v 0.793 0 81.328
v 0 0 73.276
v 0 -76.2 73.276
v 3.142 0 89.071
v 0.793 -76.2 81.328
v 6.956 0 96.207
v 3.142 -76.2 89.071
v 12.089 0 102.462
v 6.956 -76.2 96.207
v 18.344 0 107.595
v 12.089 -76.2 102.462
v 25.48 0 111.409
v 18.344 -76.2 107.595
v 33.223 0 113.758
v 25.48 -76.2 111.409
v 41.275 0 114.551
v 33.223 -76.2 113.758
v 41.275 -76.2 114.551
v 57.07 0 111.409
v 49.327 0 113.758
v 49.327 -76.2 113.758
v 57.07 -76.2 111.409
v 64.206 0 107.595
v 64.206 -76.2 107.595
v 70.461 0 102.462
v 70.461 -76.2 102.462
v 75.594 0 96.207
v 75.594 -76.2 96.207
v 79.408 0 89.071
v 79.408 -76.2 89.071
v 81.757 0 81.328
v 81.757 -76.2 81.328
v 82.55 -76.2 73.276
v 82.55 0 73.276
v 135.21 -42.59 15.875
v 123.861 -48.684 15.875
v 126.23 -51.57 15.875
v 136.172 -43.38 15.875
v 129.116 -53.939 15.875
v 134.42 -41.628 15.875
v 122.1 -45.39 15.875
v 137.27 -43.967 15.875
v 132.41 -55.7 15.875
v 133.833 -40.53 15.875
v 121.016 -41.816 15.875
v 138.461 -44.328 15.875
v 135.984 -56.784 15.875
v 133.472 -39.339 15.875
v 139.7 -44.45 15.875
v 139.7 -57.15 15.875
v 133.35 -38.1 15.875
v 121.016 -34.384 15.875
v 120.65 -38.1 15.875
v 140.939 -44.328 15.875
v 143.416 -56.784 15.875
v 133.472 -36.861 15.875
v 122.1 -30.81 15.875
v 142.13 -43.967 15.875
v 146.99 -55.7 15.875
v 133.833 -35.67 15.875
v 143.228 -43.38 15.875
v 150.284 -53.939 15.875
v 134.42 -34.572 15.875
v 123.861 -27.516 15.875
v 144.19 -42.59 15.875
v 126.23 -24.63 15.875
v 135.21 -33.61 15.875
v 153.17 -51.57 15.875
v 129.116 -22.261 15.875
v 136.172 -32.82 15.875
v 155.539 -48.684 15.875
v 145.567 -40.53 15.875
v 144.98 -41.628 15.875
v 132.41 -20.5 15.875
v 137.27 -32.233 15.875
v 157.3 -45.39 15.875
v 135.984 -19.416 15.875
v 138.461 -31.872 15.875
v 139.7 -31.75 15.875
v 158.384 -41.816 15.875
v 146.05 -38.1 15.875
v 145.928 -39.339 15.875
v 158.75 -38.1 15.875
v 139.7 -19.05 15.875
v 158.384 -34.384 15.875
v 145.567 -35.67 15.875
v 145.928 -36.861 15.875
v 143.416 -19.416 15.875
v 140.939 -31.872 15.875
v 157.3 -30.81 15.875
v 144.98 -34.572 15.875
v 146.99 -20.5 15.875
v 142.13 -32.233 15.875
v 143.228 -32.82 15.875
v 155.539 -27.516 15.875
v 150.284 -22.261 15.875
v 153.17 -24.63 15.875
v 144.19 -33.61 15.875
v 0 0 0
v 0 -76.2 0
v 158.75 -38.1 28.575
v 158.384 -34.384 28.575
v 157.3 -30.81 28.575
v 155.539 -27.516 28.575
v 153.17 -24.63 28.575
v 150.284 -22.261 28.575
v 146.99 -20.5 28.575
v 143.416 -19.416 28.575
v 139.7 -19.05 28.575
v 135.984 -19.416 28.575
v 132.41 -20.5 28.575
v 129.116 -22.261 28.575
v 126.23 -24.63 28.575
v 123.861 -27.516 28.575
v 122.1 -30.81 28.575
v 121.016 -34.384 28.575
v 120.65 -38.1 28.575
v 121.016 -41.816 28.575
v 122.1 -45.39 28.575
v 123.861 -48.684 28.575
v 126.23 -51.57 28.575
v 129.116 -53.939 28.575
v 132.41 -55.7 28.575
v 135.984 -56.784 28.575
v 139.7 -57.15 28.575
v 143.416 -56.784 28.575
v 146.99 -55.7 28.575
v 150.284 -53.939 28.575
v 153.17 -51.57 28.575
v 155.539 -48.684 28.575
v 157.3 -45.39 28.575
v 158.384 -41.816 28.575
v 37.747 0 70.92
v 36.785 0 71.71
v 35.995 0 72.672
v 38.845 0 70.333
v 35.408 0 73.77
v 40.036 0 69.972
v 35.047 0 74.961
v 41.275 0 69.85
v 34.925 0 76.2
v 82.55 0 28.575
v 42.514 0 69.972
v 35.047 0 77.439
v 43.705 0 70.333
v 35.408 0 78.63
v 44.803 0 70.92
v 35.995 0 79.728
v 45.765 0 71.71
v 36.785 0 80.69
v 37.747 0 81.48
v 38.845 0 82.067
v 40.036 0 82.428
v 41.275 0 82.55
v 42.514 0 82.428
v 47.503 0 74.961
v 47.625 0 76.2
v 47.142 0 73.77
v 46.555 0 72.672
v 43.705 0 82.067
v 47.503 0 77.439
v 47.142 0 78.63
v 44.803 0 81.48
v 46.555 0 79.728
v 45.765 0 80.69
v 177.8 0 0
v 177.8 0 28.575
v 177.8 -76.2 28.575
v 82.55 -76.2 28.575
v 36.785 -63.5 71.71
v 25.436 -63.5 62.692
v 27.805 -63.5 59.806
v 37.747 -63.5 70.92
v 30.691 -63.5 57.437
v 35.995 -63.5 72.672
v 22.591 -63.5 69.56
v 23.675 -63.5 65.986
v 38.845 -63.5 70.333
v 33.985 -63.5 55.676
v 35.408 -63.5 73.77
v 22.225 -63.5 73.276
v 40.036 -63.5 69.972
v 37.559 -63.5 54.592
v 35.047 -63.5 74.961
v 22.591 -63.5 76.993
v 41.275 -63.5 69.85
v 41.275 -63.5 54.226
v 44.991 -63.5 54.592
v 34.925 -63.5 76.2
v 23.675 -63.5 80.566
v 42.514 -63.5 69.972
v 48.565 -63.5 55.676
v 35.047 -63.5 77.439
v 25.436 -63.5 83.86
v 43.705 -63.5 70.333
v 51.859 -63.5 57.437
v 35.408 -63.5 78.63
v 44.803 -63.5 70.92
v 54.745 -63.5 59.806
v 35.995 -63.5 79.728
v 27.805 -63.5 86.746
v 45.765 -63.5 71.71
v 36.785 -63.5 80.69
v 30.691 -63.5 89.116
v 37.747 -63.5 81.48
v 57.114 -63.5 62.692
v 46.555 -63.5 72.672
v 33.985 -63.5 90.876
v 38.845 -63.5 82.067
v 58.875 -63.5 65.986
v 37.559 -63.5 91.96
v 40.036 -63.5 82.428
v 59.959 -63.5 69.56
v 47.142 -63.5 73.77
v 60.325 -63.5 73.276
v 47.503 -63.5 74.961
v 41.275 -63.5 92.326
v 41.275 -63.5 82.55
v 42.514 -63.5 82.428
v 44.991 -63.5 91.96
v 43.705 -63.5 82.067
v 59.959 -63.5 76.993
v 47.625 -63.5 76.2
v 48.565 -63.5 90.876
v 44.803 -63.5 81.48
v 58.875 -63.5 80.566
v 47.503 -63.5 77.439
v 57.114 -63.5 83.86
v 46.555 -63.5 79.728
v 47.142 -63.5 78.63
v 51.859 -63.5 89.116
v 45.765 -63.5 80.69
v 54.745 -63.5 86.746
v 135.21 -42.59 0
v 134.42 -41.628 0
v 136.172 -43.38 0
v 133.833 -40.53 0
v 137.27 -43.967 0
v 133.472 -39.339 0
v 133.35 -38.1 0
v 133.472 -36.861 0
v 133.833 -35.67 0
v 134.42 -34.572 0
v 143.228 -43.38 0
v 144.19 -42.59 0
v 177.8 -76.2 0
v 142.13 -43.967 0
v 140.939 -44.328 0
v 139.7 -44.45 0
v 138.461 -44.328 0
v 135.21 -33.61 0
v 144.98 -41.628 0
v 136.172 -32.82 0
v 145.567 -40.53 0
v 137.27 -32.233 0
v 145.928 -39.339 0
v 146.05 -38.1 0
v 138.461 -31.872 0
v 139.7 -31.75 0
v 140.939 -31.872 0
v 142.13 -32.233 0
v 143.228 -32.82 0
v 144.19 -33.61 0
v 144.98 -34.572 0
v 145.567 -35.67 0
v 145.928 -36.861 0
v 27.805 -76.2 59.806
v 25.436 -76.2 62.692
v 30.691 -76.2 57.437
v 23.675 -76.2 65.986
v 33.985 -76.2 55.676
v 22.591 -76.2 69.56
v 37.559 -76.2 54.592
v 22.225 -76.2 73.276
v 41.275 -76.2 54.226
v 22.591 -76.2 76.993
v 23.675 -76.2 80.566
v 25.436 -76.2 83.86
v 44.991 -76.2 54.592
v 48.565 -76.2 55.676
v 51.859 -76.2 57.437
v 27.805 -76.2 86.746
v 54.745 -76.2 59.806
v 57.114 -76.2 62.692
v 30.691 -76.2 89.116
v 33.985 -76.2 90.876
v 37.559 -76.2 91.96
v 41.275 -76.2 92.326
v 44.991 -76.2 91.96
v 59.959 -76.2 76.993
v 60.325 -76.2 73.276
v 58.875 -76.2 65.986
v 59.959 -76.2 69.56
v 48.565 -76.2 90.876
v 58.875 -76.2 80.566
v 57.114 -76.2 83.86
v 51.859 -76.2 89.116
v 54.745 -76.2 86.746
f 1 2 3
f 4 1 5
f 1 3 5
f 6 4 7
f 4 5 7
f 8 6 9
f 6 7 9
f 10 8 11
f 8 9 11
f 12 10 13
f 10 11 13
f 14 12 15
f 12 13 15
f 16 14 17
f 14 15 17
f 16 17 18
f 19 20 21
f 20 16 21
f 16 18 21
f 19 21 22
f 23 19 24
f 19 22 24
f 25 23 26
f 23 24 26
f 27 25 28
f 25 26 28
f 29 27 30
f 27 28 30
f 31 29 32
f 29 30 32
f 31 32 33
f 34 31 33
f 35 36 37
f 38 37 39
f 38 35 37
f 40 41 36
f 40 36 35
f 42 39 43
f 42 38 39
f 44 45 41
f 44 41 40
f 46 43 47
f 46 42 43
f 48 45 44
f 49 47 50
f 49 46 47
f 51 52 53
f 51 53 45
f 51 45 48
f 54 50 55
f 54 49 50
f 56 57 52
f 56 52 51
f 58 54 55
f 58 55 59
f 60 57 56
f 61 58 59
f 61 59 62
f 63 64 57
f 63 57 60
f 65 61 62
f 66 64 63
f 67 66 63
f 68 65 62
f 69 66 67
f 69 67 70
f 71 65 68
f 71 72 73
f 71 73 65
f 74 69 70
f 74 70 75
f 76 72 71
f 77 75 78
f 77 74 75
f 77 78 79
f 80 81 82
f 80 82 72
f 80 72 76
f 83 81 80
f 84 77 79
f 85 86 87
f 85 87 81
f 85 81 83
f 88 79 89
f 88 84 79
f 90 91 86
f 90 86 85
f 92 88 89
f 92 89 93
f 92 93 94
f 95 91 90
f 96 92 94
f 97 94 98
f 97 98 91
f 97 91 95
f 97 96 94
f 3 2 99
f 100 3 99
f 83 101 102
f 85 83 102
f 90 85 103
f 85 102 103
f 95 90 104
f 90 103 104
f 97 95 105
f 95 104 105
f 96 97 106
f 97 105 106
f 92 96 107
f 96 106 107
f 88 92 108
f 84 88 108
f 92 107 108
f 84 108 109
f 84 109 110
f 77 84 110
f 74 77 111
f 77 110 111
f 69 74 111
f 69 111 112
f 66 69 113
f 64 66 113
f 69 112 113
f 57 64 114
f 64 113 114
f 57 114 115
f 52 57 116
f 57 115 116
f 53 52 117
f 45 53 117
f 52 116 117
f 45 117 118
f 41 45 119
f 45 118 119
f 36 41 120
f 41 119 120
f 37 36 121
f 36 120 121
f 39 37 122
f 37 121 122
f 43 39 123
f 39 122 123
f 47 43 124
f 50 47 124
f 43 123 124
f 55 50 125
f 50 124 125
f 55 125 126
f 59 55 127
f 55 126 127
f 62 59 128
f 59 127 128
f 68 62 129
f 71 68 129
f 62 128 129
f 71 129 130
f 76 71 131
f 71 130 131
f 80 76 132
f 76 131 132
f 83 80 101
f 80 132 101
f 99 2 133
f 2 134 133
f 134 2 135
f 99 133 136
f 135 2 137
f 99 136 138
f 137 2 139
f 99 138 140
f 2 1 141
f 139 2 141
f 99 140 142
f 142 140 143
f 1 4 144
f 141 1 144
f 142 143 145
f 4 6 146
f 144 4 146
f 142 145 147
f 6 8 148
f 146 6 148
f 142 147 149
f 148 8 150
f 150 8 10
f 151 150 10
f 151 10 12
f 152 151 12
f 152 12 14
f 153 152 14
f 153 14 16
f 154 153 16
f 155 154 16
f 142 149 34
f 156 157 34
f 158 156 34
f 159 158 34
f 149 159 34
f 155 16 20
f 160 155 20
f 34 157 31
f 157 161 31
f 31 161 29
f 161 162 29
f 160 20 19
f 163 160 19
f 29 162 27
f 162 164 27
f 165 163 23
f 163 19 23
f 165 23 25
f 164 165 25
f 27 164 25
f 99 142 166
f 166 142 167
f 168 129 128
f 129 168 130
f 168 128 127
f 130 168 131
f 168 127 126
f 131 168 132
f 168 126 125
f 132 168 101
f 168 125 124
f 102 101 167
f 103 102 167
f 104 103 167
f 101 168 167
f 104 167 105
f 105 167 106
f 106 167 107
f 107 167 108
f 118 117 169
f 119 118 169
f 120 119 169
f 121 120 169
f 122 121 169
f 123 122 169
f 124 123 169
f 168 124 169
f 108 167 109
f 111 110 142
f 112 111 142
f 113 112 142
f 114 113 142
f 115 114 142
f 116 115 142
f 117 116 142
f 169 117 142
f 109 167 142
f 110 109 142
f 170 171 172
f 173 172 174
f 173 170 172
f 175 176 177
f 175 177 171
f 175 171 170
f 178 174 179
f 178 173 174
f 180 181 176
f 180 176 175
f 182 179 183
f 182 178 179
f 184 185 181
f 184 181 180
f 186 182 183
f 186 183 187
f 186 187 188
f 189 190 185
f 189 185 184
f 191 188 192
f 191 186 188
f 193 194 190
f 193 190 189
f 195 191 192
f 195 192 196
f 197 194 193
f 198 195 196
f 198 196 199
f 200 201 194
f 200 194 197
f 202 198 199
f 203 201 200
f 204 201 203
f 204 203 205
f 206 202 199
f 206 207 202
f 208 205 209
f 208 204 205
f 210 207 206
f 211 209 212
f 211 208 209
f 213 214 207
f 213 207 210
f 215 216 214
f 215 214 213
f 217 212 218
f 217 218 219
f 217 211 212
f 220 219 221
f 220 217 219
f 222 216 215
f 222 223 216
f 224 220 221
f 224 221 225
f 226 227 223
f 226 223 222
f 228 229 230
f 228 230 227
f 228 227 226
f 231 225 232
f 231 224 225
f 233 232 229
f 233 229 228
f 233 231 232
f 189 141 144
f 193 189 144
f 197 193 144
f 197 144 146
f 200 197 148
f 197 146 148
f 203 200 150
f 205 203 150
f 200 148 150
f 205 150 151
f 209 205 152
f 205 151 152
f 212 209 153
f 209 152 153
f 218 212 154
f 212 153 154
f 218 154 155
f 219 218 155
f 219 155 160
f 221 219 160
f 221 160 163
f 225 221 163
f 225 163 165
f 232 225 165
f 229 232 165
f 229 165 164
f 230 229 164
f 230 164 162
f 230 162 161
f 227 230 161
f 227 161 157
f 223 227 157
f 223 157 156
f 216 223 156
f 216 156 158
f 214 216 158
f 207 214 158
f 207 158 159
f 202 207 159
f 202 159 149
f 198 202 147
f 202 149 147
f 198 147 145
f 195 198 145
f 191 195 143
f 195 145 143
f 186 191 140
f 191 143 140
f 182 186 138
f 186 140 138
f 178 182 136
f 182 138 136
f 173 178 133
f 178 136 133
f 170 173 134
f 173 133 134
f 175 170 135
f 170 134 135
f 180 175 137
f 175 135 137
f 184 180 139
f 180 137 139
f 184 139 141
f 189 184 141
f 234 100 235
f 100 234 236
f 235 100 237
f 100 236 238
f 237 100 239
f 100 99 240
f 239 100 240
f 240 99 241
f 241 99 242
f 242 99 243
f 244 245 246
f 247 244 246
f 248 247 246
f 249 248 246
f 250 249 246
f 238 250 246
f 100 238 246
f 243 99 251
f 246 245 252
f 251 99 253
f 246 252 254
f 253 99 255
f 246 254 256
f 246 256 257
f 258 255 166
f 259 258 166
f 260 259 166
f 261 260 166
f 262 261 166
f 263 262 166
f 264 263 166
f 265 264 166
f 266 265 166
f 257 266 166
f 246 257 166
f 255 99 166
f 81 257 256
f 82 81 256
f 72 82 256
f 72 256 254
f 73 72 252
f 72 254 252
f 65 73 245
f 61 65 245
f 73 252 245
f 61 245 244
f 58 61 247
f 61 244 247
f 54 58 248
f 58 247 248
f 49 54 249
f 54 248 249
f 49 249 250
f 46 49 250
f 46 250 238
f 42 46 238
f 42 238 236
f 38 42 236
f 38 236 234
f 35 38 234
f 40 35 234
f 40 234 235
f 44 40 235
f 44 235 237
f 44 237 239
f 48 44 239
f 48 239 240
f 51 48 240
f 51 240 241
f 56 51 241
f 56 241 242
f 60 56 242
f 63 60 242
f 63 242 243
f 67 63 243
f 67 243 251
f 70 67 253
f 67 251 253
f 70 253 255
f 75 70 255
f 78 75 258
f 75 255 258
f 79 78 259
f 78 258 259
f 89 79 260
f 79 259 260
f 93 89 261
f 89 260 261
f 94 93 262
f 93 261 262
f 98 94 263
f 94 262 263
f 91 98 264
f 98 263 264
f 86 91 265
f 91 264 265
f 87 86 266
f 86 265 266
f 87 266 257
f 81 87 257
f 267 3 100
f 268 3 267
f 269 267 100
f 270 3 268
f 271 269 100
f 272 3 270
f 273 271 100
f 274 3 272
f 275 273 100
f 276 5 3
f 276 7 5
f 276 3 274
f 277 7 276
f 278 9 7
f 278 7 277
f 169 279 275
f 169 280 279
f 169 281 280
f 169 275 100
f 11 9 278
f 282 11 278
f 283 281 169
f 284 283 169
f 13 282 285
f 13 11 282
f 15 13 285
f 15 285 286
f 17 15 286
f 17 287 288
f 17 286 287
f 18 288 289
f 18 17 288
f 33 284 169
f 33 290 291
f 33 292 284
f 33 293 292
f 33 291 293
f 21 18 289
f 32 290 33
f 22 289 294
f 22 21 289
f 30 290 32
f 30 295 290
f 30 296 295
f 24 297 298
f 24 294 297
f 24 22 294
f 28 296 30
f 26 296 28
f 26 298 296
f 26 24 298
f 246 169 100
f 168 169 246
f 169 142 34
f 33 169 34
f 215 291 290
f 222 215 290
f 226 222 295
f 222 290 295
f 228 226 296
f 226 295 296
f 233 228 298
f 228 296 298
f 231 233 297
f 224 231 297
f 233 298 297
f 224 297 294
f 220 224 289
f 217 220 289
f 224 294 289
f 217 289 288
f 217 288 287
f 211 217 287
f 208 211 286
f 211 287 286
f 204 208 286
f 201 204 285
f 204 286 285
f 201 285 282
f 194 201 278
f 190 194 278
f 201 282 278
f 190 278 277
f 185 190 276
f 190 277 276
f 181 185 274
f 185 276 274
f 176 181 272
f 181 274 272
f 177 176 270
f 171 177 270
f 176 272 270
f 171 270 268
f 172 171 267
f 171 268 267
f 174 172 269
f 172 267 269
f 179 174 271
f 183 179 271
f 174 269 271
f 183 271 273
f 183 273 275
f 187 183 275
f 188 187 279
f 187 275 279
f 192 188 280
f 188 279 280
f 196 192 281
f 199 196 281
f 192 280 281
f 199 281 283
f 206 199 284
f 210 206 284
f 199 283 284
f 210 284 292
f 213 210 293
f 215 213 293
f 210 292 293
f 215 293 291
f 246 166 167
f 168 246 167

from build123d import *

# Parameters (mm, degrees)
F1_DEPTH  = 76.2
F3_DEPTH  = 76.201
F4_R      = 19.05
F5_DEPTH  = 12.7
F6_R      = 6.35
F7_DEPTH  = 76.201
F8_R      = 19.05
F9_DEPTH  = 12.7
F10_R     = 6.35
F11_DEPTH = 114.552047


with BuildPart() as f1:
    # F0 (on Front) → F1 (new body)
    with BuildSketch(Plane.XZ):
        Polygon((0, 127), (0, 0), (177.8, 0), (177.8, 28.575), (82.55, 28.575), (82.55, 127), align=None)
    extrude(amount=F1_DEPTH)

    # F2 (on face) → F3 (cut, through all)
    with BuildSketch(Plane.XZ.offset(76.2)):
        with BuildLine():
            ThreePointArc((0, 73.276047), (41.275, 114.551047), (82.55, 73.276047))
            Line((82.55, 73.276047), (82.55, 127))
            Line((82.55, 127), (0, 127))
            Line((0, 127), (0, 73.276047))
        make_face()
    extrude(amount=-F3_DEPTH, mode=Mode.SUBTRACT)

    # F4 (on face) → F5 (cut)
    with BuildSketch(Plane.XZ.offset(76.2)):
        with Locations((41.275, 73.276047)):
            Circle(F4_R)
    extrude(amount=-F5_DEPTH, mode=Mode.SUBTRACT)

    # F6 (on face) → F7 (cut, through all)
    with BuildSketch(Plane(origin=(0, 0, 0), x_dir=(-1, 0, 0), z_dir=(0, 1, 0))):
        with Locations((-41.275, 76.2)):
            Circle(F6_R)
    extrude(amount=-F7_DEPTH, mode=Mode.SUBTRACT)

    # F8 (on face) → F9 (cut)
    with BuildSketch(Plane.XY.offset(28.575)):
        with Locations((139.7, -38.1)):
            Circle(F8_R)
    extrude(amount=-F9_DEPTH, mode=Mode.SUBTRACT)

    # F10 (on face) → F11 (cut, through all)
    with BuildSketch(Plane(origin=(0, 0, 0), x_dir=(1, 0, 0), z_dir=(0, 0, -1))):
        with Locations((139.7, 38.1)):
            Circle(F10_R)
    extrude(amount=-F11_DEPTH, mode=Mode.SUBTRACT)


solid = f1.part
